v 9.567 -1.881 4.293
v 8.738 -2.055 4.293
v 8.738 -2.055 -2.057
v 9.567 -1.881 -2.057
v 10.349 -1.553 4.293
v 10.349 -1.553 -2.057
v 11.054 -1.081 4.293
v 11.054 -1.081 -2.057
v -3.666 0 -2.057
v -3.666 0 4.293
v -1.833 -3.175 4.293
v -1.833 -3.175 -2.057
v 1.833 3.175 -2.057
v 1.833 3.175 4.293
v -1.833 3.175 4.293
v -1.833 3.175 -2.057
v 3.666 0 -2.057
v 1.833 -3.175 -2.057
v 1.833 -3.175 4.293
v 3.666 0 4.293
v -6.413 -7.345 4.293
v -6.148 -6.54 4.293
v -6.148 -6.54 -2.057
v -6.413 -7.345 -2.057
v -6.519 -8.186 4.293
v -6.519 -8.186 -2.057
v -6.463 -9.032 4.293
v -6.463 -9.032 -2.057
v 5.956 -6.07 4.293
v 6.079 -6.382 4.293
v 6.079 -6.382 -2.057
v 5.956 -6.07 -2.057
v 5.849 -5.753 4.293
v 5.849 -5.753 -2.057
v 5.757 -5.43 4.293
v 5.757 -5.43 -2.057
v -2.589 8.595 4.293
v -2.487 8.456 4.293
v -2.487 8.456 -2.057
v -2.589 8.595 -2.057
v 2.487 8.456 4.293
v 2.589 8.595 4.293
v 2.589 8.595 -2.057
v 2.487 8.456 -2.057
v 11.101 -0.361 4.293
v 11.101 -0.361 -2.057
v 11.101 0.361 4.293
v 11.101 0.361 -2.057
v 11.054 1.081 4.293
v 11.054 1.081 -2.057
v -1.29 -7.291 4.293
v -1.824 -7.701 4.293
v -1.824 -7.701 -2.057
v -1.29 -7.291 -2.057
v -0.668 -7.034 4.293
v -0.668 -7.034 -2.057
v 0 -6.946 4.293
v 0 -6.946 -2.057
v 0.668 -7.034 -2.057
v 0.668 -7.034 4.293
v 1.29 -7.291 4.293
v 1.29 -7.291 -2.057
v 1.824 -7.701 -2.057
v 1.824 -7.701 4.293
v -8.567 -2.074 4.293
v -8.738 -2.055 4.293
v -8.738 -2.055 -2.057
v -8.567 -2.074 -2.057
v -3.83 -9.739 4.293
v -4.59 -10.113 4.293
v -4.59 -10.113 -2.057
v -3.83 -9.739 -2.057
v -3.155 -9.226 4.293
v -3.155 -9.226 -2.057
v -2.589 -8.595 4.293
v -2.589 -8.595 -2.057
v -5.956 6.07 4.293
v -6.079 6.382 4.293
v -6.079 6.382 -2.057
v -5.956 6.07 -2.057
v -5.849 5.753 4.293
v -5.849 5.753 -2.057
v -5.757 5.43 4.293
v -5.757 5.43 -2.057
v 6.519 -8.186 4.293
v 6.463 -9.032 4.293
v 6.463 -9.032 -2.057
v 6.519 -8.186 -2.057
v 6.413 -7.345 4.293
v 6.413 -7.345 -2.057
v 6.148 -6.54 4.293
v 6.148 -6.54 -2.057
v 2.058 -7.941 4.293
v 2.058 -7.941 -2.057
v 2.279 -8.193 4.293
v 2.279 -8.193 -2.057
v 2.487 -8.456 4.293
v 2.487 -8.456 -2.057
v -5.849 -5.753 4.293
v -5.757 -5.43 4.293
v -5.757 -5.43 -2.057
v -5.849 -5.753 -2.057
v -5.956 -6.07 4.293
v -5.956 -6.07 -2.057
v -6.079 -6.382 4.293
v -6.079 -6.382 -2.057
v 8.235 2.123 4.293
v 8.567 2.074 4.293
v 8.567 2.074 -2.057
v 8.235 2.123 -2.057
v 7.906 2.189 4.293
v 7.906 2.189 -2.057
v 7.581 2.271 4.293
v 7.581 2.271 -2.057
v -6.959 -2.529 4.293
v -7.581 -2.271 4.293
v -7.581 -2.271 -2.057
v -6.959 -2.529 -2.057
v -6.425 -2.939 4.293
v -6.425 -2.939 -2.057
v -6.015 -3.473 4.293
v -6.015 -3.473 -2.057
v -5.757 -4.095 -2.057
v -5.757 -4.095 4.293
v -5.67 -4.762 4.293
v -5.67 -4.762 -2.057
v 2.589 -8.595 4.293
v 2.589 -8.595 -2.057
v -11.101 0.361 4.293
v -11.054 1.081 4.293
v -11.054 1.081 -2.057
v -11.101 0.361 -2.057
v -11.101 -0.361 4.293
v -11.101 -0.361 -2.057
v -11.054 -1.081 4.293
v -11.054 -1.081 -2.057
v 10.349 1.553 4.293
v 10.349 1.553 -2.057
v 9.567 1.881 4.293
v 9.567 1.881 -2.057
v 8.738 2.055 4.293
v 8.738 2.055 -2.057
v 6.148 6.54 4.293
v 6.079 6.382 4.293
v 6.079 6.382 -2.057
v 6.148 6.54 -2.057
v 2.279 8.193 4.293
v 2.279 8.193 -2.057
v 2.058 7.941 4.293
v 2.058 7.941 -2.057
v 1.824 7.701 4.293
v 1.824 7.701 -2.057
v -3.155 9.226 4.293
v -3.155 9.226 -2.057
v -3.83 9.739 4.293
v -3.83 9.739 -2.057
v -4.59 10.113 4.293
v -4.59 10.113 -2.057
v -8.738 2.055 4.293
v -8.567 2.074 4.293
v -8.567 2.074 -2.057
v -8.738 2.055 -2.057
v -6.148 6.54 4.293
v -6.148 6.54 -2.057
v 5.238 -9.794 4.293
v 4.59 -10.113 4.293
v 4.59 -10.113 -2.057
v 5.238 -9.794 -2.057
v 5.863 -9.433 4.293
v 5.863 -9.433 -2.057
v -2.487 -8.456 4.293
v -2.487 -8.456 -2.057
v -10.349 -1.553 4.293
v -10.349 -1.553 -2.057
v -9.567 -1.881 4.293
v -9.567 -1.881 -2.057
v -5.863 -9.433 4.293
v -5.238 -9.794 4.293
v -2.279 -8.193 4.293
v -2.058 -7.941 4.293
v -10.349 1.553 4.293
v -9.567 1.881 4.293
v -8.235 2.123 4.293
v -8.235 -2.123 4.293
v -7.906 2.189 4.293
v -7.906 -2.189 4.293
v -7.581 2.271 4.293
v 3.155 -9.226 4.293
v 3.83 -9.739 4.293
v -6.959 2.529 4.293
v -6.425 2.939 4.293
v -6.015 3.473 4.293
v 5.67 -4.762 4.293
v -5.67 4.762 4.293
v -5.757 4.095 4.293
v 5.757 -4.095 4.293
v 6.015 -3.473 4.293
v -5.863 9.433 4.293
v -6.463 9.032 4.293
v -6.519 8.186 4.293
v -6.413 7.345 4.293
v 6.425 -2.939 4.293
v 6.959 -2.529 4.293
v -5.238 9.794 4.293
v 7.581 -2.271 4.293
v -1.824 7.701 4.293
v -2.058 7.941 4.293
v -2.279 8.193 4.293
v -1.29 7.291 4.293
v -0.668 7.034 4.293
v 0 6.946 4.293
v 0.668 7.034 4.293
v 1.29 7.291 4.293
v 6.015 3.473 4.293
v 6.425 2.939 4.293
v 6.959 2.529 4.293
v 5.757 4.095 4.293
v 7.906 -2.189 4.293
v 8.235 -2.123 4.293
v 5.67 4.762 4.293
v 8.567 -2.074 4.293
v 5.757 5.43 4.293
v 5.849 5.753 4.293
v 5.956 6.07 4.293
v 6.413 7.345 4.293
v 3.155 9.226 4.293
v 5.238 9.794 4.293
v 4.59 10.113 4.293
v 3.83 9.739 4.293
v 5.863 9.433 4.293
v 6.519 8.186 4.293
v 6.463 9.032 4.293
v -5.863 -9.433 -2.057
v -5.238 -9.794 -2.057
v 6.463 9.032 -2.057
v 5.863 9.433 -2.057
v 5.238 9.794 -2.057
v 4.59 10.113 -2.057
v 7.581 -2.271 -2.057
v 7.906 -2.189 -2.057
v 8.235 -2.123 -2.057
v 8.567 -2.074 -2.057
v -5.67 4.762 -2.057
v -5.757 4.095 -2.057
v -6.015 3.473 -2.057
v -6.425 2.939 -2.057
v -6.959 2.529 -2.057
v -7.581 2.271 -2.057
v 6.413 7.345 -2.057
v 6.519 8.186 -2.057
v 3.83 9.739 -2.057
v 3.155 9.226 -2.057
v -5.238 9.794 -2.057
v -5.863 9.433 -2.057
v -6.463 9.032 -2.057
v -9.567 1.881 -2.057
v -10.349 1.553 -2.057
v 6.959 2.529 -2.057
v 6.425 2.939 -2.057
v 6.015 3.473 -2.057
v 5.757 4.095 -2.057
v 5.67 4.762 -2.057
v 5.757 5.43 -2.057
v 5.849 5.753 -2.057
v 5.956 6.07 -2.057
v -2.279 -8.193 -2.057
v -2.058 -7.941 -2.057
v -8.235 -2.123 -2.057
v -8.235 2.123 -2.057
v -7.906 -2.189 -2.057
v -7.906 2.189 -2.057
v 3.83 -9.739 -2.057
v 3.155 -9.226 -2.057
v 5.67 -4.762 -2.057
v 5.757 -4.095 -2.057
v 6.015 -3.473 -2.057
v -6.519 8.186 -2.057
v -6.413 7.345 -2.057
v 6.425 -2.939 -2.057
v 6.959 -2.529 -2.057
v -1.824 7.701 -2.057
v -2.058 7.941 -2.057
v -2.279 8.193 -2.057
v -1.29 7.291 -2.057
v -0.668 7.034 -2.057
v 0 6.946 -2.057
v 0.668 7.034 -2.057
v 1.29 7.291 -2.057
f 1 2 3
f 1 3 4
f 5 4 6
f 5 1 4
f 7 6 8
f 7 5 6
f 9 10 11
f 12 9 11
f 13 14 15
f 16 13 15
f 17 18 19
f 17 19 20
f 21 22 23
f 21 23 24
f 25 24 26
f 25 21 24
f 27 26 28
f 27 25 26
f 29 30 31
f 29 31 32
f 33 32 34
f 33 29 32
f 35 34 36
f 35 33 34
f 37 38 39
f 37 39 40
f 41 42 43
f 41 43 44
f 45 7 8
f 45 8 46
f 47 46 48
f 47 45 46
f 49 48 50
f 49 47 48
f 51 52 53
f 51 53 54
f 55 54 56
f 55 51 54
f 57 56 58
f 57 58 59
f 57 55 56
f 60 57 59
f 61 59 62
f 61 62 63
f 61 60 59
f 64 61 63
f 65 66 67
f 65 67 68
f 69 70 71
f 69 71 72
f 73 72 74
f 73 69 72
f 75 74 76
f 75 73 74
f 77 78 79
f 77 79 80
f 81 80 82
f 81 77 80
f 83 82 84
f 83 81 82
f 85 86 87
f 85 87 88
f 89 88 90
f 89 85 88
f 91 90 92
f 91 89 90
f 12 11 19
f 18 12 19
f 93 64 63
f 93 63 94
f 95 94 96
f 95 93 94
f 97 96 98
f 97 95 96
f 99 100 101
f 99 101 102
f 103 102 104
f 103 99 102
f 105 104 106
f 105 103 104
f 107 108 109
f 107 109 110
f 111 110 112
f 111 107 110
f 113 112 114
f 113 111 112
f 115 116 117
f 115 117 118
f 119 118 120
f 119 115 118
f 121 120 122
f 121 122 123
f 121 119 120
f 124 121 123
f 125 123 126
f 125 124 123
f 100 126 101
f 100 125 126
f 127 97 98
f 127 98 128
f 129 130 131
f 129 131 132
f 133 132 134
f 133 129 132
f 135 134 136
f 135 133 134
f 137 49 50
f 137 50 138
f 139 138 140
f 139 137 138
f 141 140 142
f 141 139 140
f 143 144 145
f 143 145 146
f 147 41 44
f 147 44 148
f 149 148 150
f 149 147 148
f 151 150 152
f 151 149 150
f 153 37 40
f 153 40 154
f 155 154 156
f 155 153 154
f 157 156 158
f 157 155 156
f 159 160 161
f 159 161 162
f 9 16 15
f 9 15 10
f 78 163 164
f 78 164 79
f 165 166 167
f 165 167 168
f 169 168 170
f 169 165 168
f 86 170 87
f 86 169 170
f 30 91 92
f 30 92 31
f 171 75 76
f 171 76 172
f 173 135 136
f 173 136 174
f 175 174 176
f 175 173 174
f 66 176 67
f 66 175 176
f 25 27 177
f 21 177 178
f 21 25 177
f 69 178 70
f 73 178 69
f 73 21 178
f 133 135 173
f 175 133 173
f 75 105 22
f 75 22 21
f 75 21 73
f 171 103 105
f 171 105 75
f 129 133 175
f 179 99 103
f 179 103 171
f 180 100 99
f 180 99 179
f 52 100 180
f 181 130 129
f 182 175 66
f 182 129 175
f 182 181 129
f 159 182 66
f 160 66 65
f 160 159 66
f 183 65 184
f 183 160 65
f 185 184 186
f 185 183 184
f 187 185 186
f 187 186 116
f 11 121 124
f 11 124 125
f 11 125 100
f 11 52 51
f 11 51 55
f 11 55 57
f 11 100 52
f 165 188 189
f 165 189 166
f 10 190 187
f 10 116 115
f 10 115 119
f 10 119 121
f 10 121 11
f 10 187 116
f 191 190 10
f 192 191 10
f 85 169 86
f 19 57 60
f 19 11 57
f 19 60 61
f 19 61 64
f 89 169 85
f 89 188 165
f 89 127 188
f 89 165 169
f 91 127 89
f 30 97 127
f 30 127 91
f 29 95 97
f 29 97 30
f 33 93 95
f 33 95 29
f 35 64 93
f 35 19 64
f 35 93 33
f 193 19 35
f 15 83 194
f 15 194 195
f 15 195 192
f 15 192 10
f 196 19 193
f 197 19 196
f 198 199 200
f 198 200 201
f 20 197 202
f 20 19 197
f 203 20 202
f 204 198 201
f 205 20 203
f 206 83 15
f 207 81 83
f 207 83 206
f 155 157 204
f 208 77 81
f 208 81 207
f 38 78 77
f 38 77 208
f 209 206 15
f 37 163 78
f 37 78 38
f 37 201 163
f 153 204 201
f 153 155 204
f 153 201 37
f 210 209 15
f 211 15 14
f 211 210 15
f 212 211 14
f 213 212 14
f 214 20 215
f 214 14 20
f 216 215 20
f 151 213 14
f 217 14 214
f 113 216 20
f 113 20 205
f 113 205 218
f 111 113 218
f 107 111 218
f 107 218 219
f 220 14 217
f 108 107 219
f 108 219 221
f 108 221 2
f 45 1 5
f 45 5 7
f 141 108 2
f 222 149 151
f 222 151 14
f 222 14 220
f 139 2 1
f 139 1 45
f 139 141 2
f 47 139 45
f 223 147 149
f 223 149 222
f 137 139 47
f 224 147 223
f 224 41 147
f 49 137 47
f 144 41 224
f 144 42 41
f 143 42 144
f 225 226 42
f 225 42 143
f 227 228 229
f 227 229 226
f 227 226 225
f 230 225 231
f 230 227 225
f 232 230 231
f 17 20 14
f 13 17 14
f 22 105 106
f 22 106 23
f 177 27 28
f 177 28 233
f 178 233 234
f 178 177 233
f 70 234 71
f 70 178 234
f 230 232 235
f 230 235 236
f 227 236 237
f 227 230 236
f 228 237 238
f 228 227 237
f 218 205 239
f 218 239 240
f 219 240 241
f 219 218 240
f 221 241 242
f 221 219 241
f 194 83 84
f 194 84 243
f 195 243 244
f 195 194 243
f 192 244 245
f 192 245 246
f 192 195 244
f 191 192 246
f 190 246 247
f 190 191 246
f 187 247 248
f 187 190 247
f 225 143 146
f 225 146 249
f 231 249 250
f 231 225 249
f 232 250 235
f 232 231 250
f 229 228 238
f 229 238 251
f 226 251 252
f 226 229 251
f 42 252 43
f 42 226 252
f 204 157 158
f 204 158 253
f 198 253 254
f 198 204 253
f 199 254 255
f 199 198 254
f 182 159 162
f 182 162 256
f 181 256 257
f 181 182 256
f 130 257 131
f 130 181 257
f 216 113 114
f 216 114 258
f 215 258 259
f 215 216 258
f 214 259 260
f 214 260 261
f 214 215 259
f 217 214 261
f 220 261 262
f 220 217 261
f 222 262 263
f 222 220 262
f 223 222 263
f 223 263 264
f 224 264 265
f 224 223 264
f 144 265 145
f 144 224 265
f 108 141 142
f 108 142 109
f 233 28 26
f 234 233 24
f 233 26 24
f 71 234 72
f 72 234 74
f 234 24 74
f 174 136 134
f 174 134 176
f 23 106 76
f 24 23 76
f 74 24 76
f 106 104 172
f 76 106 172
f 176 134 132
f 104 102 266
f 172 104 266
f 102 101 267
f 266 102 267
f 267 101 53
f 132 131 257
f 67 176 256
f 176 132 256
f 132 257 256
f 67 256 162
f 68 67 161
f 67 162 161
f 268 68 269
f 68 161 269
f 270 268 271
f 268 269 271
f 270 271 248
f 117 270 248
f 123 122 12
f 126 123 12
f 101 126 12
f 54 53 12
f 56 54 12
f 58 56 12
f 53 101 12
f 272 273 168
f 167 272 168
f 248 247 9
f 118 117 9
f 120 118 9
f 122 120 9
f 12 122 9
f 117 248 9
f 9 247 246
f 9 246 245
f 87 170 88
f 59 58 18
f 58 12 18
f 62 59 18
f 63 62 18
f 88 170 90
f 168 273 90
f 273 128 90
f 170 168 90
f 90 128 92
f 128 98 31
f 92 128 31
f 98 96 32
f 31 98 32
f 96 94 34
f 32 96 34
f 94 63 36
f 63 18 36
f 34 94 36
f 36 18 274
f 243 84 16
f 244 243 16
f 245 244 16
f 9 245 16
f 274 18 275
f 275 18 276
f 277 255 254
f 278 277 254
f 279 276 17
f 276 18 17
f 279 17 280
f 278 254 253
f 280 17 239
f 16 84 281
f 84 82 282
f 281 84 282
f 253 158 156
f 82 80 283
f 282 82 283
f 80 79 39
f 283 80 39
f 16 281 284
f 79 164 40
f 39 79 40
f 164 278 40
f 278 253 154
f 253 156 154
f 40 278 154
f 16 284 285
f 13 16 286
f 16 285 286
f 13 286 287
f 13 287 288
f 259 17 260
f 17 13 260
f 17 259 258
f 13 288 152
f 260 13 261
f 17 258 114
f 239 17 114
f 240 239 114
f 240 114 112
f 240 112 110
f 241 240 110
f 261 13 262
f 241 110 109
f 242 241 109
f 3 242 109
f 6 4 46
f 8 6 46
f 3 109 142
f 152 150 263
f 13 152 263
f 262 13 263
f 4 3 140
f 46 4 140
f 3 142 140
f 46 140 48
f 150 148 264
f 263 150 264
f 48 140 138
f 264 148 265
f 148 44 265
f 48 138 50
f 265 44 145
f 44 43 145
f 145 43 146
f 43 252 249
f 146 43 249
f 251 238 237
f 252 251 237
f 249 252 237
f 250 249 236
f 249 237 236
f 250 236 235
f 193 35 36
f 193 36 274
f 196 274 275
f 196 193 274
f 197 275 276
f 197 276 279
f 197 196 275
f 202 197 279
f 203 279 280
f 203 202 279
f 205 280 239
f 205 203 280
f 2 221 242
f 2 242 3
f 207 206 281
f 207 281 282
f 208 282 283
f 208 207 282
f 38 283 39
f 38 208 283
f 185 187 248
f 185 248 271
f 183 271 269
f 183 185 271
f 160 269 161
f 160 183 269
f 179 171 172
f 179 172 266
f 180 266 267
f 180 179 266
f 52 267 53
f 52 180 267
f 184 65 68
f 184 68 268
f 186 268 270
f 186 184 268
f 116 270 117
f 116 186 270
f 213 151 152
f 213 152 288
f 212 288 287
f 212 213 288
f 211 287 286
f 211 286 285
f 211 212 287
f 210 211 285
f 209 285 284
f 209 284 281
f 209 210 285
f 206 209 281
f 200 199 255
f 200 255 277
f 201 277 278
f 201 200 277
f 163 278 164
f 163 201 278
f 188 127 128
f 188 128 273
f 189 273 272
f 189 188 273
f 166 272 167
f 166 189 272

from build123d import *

# Parameters (mm, degrees)
BOSS_EXTRUDE1_DEPTH = 6.35
CUT_EXTRUDE1_DEPTH  = 17.308131721


with BuildPart() as part:
    # Sketch1 → Boss-Extrude1 (new body)
    with BuildSketch(Plane.XY.offset(4.2926)):
        with BuildLine():
            Line((-6.148414016, 6.539673115), (-6.079307951, 6.381995928))
            ThreePointArc((-6.079307951, 6.381995928), (-5.900367293, 5.91212738), (-5.757411872, 5.43009008))
            ThreePointArc((-5.757411872, 5.43009008), (-6.015092025, 3.472815), (-7.581301891, 2.271019901))
            ThreePointArc((-7.581301891, 2.271019901), (-8.070236148, 2.153804277), (-8.566624576, 2.073837159))
            Line((-8.566624576, 2.073837159), (-8.737730058, 2.054846173))
            ThreePointArc((-8.737730058, 2.054846173), (-9.966107592, 1.73564362), (-11.053625442, 1.081345092))
            ThreePointArc((-11.053625442, 1.081345092), (-11.106391971, 0), (-11.053625442, -1.081345092))
            ThreePointArc((-11.053625442, -1.081345092), (-9.966107592, -1.73564362), (-8.737730058, -2.054846173))
            Line((-8.737730058, -2.054846173), (-8.566624576, -2.073837159))
            ThreePointArc((-8.566624576, -2.073837159), (-8.070236148, -2.153804277), (-7.581301891, -2.271019901))
            ThreePointArc((-7.581301891, -2.271019901), (-6.015092025, -3.472815), (-5.757411872, -5.43009008))
            ThreePointArc((-5.757411872, -5.43009008), (-5.900367293, -5.91212738), (-6.079307951, -6.381995928))
            Line((-6.079307951, -6.381995928), (-6.148414016, -6.539673115))
            ThreePointArc((-6.148414016, -6.539673115), (-6.486165263, -7.763080542), (-6.463285041, -9.03204789))
            ThreePointArc((-6.463285041, -9.03204789), (-5.553195986, -9.618417591), (-4.590340401, -10.113392982))
            ThreePointArc((-4.590340401, -10.113392982), (-3.479942329, -9.498724162), (-2.589316042, -8.594519288))
            Line((-2.589316042, -8.594519288), (-2.487316625, -8.455833087))
            ThreePointArc((-2.487316625, -8.455833087), (-2.169868855, -8.065931658), (-1.823890018, -7.701109982))
            ThreePointArc((-1.823890018, -7.701109982), (0, -6.94563), (1.823890018, -7.701109982))
            ThreePointArc((1.823890018, -7.701109982), (2.169868855, -8.065931658), (2.487316625, -8.455833087))
            Line((2.487316625, -8.455833087), (2.589316042, -8.594519288))
            ThreePointArc((2.589316042, -8.594519288), (3.479942329, -9.498724162), (4.590340401, -10.113392982))
            ThreePointArc((4.590340401, -10.113392982), (5.553195986, -9.618417591), (6.463285041, -9.03204789))
            ThreePointArc((6.463285041, -9.03204789), (6.486165263, -7.763080542), (6.148414016, -6.539673115))
            Line((6.148414016, -6.539673115), (6.079307951, -6.381995928))
            ThreePointArc((6.079307951, -6.381995928), (5.900367293, -5.91212738), (5.757411872, -5.43009008))
            ThreePointArc((5.757411872, -5.43009008), (6.015092025, -3.472815), (7.581301891, -2.271019901))
            ThreePointArc((7.581301891, -2.271019901), (8.070236148, -2.153804277), (8.566624576, -2.073837159))
            Line((8.566624576, -2.073837159), (8.737730058, -2.054846173))
            ThreePointArc((8.737730058, -2.054846173), (9.966107592, -1.73564362), (11.053625442, -1.081345092))
            ThreePointArc((11.053625442, -1.081345092), (11.106391971, 0), (11.053625442, 1.081345092))
            ThreePointArc((11.053625442, 1.081345092), (9.966107592, 1.73564362), (8.737730058, 2.054846173))
            Line((8.737730058, 2.054846173), (8.566624576, 2.073837159))
            ThreePointArc((8.566624576, 2.073837159), (8.070236148, 2.153804277), (7.581301891, 2.271019901))
            ThreePointArc((7.581301891, 2.271019901), (6.015092025, 3.472815), (5.757411872, 5.43009008))
            ThreePointArc((5.757411872, 5.43009008), (5.900367293, 5.91212738), (6.079307951, 6.381995928))
            Line((6.079307951, 6.381995928), (6.148414016, 6.539673115))
            ThreePointArc((6.148414016, 6.539673115), (6.486165263, 7.763080542), (6.463285041, 9.03204789))
            ThreePointArc((6.463285041, 9.03204789), (5.553195986, 9.618417591), (4.590340401, 10.113392982))
            ThreePointArc((4.590340401, 10.113392982), (3.479942329, 9.498724162), (2.589316042, 8.594519288))
            Line((2.589316042, 8.594519288), (2.487316625, 8.455833087))
            ThreePointArc((2.487316625, 8.455833087), (2.169868855, 8.065931658), (1.823890018, 7.701109982))
            ThreePointArc((1.823890018, 7.701109982), (0, 6.94563), (-1.823890018, 7.701109982))
            ThreePointArc((-1.823890018, 7.701109982), (-2.169868855, 8.065931658), (-2.487316625, 8.455833087))
            Line((-2.487316625, 8.455833087), (-2.589316042, 8.594519288))
            ThreePointArc((-2.589316042, 8.594519288), (-3.479942329, 9.498724162), (-4.590340401, 10.113392982))
            ThreePointArc((-4.590340401, 10.113392982), (-5.553195986, 9.618417591), (-6.463285041, 9.03204789))
            ThreePointArc((-6.463285041, 9.03204789), (-6.486165263, 7.763080542), (-6.148414016, 6.539673115))
        make_face()
    extrude(amount=-BOSS_EXTRUDE1_DEPTH)

    # Sketch2 → Cut-Extrude1 (cut, through all)
    with BuildSketch(Plane.XY.offset(4.2926)):
        Polygon((3.666174209, 0), (1.833087105, 3.175), (-1.833087105, 3.175), (-3.666174209, 0), (-1.833087105, -3.175), (1.833087105, -3.175), align=None)
    extrude(amount=-CUT_EXTRUDE1_DEPTH, mode=Mode.SUBTRACT)


solid = part.part
